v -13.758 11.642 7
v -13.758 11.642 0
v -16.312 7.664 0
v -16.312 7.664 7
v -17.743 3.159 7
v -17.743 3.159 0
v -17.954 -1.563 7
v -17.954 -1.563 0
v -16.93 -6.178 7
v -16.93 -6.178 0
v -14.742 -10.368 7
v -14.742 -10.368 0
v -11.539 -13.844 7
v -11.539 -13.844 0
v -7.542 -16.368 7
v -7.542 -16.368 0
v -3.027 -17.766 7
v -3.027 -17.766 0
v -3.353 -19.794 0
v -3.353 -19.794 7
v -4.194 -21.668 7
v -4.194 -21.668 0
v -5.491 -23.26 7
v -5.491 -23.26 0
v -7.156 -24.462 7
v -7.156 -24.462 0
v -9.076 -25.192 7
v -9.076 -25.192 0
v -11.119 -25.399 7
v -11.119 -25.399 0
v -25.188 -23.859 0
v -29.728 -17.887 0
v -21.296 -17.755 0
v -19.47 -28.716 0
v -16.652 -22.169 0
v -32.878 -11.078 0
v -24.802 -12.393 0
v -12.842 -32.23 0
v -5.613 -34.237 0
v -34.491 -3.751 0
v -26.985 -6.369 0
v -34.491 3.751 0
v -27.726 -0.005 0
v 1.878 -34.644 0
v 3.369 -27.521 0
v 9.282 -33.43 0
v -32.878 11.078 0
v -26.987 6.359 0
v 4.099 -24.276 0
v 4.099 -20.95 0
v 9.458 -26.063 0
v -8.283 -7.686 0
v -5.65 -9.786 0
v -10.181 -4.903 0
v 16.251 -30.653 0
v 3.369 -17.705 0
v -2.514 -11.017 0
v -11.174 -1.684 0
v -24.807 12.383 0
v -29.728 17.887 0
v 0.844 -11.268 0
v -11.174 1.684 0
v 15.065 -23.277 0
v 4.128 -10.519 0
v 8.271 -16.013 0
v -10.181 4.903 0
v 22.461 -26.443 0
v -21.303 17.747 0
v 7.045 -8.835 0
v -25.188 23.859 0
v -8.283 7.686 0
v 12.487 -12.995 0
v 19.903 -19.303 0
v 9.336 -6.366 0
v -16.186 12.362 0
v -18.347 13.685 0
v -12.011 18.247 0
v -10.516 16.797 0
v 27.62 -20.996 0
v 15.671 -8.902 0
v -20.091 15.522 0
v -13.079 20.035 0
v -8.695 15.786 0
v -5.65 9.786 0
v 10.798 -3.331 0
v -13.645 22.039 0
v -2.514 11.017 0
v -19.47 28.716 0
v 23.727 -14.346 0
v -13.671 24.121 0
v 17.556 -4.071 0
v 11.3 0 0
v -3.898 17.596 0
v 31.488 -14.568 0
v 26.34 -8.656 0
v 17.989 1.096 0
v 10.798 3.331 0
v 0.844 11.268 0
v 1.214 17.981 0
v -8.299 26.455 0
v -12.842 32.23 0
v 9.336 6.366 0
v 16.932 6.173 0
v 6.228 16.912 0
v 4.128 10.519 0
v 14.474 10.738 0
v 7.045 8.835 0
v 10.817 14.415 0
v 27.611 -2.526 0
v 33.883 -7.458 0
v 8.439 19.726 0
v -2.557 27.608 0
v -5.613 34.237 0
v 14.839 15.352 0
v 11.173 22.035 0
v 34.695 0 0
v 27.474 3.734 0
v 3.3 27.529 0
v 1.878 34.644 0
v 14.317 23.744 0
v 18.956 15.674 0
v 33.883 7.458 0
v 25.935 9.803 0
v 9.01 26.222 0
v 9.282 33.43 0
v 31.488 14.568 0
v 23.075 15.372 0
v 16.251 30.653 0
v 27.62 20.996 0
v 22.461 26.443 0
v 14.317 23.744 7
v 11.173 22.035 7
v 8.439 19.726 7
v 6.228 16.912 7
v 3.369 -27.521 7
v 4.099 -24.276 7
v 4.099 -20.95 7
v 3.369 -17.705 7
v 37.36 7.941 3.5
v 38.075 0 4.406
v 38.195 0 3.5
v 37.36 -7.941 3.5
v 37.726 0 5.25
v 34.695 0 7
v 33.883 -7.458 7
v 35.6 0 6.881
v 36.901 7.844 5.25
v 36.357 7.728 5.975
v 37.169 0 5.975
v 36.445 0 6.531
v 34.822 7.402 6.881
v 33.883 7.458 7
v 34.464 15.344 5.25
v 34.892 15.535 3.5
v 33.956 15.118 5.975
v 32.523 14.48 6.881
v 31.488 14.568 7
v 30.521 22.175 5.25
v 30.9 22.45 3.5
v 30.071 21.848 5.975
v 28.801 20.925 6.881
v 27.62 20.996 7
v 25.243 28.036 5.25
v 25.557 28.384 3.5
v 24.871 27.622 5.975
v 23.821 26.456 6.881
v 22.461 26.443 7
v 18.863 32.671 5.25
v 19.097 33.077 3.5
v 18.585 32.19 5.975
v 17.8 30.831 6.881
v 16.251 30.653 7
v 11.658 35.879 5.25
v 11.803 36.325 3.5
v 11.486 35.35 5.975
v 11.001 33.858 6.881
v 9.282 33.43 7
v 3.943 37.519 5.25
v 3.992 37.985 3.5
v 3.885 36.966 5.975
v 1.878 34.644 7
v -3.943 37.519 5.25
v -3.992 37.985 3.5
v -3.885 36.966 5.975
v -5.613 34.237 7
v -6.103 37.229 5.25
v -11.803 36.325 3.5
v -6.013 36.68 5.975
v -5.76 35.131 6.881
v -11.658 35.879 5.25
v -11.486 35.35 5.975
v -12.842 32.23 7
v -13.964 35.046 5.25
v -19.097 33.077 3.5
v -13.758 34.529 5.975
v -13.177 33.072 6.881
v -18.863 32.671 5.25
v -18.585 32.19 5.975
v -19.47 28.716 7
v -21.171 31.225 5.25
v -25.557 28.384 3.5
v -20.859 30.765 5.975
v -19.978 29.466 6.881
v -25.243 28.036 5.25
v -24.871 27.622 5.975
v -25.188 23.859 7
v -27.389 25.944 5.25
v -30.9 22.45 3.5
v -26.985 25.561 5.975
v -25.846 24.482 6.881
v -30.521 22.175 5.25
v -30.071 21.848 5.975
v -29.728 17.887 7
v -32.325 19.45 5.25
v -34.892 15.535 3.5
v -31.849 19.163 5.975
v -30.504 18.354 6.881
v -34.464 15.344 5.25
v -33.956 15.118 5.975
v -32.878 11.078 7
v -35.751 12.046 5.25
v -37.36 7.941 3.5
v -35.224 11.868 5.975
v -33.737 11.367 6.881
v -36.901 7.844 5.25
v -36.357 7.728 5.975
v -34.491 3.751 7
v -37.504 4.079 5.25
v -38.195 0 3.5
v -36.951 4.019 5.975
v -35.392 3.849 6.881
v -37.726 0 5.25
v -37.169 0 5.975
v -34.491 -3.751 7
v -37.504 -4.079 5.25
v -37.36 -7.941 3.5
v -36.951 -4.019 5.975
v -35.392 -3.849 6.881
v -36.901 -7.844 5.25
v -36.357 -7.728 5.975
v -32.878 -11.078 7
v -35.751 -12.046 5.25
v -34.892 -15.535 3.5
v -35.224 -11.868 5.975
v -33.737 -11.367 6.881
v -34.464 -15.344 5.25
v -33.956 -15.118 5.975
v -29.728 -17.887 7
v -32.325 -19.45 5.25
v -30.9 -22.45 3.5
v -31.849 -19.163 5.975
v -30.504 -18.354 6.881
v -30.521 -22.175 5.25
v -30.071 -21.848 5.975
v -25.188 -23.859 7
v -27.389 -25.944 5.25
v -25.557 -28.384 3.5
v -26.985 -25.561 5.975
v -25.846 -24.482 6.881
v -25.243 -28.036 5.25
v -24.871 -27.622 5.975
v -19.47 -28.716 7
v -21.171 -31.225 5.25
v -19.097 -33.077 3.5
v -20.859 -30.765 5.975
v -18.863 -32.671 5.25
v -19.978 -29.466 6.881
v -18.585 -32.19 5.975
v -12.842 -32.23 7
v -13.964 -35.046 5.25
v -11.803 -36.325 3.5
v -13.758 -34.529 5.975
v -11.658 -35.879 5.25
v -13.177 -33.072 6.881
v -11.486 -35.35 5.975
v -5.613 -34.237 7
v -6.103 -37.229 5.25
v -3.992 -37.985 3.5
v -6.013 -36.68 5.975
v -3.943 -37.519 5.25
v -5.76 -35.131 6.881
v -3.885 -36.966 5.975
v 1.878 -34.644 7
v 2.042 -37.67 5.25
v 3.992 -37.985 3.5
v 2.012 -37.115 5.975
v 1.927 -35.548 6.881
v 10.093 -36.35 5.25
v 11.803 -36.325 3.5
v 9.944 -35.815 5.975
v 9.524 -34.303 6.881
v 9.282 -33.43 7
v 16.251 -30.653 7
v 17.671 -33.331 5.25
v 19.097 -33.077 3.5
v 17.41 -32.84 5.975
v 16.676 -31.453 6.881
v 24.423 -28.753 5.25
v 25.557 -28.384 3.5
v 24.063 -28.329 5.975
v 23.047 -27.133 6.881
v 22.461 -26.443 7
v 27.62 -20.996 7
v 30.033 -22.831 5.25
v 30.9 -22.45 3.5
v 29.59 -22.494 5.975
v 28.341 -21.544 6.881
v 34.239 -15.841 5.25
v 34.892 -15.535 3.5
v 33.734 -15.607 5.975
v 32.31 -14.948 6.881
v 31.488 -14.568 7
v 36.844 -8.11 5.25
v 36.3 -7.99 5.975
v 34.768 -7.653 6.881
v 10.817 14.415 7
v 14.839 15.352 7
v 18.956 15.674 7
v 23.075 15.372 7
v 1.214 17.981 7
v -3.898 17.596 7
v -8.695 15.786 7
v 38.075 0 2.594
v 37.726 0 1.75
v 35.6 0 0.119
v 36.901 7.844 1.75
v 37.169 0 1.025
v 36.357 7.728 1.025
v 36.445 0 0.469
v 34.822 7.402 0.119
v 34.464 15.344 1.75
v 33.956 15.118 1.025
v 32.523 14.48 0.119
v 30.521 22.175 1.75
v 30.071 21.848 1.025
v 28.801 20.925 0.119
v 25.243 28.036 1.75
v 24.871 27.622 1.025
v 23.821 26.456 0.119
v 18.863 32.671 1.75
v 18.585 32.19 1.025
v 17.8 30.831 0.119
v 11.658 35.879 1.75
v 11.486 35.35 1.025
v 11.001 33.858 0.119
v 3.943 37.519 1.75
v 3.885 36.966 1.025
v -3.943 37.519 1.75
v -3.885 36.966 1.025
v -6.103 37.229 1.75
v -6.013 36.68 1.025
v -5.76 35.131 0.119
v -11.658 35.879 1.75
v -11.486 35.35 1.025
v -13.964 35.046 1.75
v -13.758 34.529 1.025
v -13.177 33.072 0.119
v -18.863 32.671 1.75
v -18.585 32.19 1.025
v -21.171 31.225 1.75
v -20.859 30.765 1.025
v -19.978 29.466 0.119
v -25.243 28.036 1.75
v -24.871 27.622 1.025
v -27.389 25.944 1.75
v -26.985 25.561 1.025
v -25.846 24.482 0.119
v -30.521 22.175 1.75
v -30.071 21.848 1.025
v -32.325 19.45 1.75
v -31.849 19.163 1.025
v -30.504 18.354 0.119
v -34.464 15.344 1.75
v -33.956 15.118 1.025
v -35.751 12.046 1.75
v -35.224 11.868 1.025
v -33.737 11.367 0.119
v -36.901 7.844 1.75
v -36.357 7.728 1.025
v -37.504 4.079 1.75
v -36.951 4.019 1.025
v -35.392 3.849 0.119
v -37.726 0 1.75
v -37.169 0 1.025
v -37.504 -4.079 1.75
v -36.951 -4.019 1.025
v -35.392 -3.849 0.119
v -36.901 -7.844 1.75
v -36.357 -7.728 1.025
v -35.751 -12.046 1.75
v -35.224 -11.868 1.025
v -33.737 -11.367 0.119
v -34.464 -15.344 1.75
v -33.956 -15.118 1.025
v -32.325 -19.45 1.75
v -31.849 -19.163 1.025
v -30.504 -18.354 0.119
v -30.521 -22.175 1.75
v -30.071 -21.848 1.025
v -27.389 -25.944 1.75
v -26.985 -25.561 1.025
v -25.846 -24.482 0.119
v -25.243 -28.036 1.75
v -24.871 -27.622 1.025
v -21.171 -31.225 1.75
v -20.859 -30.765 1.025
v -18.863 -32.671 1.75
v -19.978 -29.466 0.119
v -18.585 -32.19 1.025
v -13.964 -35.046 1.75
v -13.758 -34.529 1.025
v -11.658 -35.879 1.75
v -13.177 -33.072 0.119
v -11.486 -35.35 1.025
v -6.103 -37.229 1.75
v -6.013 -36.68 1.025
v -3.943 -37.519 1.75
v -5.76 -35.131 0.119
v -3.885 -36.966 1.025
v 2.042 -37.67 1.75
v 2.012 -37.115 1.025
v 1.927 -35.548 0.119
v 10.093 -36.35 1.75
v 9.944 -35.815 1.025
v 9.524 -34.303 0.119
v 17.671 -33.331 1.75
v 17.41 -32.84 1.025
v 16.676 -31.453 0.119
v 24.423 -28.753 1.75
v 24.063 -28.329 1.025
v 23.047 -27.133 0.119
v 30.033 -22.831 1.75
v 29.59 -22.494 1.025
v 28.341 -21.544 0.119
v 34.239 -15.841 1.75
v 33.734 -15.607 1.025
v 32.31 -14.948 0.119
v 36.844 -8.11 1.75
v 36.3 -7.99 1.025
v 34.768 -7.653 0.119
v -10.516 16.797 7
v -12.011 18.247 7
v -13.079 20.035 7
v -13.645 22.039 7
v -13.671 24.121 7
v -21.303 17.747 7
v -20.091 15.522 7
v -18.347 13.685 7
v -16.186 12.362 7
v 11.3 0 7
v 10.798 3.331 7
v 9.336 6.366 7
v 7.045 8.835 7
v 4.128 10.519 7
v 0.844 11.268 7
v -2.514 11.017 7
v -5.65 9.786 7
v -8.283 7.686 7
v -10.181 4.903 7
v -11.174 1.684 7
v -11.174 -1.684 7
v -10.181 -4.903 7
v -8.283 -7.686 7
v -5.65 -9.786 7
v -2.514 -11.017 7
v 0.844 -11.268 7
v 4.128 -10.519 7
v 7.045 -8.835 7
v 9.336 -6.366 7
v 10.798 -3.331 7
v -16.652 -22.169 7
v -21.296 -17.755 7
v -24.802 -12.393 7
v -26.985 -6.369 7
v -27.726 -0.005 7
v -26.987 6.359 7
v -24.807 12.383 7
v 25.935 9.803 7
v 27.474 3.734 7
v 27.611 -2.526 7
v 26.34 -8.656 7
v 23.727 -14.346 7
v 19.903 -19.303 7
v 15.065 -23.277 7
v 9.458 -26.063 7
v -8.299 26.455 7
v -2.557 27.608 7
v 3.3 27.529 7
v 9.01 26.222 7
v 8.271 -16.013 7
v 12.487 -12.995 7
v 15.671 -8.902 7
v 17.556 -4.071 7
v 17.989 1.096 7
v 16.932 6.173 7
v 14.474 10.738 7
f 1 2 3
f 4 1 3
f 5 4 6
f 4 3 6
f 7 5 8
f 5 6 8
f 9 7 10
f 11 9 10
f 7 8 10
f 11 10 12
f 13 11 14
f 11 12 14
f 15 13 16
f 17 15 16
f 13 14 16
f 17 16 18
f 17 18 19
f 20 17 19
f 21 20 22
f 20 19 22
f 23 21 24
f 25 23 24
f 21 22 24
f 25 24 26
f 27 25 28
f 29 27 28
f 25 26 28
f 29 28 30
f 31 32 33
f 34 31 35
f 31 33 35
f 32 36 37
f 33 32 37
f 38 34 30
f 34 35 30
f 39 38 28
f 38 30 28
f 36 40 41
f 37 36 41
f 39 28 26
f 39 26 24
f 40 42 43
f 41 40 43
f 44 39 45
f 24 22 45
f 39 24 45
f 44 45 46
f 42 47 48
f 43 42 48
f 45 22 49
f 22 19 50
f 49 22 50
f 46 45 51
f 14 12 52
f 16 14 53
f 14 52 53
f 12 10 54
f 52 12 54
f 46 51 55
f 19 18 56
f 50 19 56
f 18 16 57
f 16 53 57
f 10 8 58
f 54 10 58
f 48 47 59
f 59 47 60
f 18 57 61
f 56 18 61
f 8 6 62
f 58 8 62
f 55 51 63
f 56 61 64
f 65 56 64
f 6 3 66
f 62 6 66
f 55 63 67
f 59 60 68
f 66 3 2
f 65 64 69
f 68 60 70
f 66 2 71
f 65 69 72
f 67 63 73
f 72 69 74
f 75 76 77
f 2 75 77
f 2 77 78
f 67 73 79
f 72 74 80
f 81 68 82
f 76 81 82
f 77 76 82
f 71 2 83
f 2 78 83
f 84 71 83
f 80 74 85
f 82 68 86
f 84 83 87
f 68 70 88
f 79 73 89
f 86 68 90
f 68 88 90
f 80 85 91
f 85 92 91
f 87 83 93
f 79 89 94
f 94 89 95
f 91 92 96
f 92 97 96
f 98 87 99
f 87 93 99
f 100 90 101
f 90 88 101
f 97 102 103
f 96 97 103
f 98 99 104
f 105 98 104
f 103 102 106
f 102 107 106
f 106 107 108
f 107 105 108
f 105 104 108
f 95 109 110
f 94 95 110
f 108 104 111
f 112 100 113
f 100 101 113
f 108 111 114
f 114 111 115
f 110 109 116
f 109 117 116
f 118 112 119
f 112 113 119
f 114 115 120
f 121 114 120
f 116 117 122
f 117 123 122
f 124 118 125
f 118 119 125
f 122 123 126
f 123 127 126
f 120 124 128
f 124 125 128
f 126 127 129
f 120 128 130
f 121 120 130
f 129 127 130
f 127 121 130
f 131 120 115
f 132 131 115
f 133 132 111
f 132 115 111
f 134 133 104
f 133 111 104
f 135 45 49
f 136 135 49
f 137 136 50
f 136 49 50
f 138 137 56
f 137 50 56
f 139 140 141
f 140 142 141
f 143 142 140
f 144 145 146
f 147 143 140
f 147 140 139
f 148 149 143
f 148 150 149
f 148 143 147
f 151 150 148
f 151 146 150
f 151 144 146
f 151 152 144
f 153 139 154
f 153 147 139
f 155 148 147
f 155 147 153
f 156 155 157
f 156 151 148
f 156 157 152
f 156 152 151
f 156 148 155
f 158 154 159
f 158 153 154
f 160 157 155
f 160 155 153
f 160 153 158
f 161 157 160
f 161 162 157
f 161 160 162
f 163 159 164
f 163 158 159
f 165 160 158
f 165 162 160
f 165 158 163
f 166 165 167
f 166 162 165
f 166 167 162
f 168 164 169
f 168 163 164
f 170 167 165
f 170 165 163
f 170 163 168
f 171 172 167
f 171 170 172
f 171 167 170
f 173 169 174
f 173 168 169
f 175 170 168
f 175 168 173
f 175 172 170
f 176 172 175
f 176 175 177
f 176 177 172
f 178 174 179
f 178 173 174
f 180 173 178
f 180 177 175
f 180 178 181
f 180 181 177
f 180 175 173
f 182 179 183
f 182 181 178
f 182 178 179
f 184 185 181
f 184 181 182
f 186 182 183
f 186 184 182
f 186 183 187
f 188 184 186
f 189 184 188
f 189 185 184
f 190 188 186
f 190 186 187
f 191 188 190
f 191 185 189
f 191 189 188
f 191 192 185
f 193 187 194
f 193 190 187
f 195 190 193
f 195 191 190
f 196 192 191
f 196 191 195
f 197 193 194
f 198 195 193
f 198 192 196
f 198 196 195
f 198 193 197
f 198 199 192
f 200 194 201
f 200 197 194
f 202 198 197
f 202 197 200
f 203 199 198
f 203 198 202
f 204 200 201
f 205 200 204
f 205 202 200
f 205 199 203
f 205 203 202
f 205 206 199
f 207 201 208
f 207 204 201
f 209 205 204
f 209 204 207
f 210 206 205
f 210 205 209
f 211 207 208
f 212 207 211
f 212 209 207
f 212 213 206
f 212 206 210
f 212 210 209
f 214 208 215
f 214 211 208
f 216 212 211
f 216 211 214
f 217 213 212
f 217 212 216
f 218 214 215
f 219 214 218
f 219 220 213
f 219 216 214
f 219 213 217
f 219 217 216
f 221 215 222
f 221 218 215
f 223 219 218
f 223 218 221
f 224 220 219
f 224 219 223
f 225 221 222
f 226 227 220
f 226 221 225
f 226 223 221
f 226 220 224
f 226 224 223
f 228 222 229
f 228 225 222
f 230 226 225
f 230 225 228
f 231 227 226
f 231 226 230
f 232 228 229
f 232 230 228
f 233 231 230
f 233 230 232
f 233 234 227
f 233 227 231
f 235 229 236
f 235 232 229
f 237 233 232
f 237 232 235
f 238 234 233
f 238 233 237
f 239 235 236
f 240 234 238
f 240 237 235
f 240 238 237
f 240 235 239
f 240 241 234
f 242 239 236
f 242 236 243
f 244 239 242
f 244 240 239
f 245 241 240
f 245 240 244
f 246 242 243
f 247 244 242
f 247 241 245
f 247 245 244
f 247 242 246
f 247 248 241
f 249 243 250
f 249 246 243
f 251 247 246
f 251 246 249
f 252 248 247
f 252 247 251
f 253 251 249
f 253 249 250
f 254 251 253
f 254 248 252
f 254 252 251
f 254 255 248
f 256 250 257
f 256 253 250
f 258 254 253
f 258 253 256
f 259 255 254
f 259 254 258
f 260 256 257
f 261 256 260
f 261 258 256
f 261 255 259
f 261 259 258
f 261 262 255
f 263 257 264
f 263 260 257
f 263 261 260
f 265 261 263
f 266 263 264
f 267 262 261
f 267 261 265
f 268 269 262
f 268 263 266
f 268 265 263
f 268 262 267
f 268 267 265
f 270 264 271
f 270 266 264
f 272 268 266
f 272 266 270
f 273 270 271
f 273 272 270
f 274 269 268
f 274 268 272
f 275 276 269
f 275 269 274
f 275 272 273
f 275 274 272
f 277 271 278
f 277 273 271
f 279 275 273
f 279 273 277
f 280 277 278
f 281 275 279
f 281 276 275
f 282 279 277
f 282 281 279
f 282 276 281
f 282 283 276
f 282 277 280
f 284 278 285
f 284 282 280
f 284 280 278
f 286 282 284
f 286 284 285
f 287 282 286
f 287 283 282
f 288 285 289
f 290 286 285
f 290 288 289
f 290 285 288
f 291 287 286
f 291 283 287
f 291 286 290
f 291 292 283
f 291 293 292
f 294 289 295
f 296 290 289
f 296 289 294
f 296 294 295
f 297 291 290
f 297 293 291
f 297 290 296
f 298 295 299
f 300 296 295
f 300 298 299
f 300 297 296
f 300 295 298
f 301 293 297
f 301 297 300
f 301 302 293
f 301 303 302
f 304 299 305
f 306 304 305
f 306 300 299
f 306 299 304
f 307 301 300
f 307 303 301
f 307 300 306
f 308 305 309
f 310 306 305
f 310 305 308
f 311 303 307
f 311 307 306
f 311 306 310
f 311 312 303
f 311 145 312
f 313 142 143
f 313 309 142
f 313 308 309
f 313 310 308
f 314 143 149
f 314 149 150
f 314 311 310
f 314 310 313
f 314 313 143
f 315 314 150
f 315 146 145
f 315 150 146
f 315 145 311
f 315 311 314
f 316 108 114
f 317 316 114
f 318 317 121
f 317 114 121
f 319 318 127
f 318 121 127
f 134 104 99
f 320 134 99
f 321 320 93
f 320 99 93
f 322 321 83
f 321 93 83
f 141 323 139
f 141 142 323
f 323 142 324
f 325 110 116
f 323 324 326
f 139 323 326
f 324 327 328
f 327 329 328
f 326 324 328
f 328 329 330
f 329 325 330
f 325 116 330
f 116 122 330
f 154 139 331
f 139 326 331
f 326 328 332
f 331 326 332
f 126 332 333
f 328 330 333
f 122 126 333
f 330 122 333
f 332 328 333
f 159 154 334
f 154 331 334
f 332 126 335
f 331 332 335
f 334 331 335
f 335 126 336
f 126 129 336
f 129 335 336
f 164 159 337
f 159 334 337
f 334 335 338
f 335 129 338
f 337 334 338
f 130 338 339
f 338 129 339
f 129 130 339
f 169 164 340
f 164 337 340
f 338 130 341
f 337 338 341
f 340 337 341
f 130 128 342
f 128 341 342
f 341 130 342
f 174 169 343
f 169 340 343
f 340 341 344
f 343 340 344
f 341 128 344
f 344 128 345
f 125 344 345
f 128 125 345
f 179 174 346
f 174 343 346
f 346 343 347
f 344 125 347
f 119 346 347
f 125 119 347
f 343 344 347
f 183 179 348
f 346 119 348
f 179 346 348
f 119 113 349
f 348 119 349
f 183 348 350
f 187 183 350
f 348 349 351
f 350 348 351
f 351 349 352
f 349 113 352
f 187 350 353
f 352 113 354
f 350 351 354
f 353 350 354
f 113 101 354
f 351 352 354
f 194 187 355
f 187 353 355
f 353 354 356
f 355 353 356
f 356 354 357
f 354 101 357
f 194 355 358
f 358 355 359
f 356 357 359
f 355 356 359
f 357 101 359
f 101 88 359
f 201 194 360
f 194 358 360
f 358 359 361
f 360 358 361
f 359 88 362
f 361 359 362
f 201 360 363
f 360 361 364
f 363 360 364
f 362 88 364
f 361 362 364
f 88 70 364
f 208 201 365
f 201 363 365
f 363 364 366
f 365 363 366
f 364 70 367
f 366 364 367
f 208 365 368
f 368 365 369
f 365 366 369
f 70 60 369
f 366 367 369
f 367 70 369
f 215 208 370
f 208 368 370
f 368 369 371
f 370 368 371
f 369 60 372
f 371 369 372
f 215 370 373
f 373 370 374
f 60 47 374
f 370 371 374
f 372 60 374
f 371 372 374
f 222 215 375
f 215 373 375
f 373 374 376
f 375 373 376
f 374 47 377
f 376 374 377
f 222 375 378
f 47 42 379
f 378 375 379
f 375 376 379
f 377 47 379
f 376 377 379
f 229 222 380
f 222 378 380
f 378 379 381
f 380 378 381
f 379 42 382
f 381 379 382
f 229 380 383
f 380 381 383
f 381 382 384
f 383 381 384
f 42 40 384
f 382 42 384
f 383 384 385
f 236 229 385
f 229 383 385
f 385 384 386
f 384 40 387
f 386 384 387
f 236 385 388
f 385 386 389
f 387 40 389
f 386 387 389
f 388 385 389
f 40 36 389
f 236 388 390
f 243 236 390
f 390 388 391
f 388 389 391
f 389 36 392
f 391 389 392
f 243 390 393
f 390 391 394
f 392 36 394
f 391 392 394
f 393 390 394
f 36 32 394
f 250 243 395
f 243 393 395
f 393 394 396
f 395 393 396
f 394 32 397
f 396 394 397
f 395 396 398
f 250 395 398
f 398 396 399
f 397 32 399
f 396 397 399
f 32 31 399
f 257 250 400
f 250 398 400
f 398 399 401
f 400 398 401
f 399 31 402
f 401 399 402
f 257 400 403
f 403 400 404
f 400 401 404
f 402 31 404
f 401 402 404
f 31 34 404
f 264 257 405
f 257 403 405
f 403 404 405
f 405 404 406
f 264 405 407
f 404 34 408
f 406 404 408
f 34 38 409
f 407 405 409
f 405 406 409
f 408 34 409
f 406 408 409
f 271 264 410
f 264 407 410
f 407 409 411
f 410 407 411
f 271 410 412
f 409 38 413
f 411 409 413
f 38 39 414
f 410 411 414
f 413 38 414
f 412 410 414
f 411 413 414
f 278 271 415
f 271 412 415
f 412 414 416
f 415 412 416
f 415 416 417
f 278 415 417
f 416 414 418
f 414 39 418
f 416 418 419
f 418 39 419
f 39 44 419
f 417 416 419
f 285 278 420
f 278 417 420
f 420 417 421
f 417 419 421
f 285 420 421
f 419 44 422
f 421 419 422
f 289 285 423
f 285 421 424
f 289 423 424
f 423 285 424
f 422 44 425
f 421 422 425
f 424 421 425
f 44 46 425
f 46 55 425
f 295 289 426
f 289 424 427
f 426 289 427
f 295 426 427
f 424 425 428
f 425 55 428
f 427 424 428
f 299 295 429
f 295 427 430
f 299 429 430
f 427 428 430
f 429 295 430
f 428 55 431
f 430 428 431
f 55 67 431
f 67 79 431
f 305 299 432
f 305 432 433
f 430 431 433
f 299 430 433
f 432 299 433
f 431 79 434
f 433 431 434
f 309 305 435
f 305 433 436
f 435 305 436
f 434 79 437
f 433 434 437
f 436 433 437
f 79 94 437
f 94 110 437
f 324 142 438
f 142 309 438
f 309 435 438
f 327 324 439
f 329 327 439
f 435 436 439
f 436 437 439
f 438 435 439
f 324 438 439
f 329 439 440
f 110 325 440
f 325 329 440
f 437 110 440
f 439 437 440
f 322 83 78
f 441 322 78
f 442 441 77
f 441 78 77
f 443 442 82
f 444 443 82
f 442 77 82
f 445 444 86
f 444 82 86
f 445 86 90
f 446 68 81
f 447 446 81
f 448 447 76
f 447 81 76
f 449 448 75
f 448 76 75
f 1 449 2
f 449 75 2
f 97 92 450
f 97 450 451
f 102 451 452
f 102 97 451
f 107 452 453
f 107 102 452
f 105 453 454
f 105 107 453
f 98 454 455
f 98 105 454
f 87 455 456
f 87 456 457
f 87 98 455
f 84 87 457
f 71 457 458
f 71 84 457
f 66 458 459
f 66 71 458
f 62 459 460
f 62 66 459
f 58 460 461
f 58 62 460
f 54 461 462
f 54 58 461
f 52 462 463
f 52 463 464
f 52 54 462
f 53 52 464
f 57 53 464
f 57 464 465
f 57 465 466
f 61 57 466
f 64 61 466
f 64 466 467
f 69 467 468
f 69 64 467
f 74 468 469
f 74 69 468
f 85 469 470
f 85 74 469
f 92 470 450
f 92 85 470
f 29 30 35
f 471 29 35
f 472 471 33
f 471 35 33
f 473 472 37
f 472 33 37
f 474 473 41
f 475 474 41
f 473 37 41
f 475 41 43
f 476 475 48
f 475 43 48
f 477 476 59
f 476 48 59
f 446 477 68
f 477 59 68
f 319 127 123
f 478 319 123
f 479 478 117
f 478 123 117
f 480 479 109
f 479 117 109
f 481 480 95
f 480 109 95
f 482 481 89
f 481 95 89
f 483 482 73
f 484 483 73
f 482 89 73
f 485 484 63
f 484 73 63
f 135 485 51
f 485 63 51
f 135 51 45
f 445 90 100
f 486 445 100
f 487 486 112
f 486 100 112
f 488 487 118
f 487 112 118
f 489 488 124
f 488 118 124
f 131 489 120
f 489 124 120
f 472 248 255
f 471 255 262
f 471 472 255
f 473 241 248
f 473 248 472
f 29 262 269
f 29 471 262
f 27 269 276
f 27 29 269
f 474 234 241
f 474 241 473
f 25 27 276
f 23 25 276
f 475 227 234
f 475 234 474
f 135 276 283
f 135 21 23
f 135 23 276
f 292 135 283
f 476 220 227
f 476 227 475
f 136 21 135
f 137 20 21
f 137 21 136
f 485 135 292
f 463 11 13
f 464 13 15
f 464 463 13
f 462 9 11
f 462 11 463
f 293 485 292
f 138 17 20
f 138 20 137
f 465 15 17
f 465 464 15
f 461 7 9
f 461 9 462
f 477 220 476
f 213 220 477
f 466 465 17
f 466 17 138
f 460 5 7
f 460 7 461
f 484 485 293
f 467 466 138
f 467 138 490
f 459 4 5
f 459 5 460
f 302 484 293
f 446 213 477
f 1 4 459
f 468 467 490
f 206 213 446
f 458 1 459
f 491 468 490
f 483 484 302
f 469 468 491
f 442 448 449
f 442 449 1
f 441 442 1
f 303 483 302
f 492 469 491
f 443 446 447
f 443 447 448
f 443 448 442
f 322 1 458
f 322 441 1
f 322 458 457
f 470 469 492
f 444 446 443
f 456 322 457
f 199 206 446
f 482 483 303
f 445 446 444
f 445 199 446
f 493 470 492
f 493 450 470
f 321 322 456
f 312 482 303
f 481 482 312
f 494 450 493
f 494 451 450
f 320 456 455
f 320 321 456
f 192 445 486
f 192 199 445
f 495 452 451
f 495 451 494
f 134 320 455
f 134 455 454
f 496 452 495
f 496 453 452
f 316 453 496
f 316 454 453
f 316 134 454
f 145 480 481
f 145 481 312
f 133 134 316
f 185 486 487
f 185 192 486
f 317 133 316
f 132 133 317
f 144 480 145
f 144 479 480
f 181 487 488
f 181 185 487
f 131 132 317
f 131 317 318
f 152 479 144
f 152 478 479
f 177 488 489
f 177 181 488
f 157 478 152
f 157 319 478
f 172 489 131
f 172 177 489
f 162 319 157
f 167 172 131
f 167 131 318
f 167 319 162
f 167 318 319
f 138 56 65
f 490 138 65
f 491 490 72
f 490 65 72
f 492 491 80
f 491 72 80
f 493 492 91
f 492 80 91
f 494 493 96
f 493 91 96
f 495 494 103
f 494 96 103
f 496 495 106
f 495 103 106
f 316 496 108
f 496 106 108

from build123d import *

# Parameters (mm, degrees)
F0_R     = 38.1945033512
F0_R_2   = 11.3
F1_DEPTH = 7
F2_R     = 3.49999


# Not quite as in the source:
# - a fillet or chamfer is up to 0.001 mm smaller than in the source, because OpenCascade refuses the exact size


with BuildPart() as f1:
    # F0 (on Top) → F1 (new body)
    with BuildSketch(Plane.XY):
        Circle(F0_R)
        with BuildLine():
            ThreePointArc((-11.1190587191, -25.3990096631), (-26.9847609568, -6.3691313979), (-21.3025923236, 17.7466255653))
            ThreePointArc((-21.3025923236, 17.7466255653), (-18.3465502514, 13.6852419499), (-13.7577746625, 11.6416763896))
            ThreePointArc((-13.7577746625, 11.6416763896), (-16.9304092047, -6.1778828887), (-3.0268251987, -17.7663536507))
            ThreePointArc((-3.0268251987, -17.7663536507), (-5.4906522747, -23.2602441725), (-11.1190587191, -25.3990096631))
        make_face(mode=Mode.SUBTRACT)
        with BuildLine():
            ThreePointArc((3.3689917925, -27.5207749339), (4.1908869079, -22.6127160748), (3.3689917925, -17.7046572157))
            ThreePointArc((3.3689917925, -17.7046572157), (17.5564618696, -4.0713191283), (10.8174583905, 14.4148391179))
            ThreePointArc((10.8174583905, 14.4148391179), (16.8916900663, 15.5906448864), (23.0748101796, 15.3719320138))
            ThreePointArc((23.0748101796, 15.3719320138), (25.1945379599, -11.5749045633), (3.3689917925, -27.5207749339))
        make_face(mode=Mode.SUBTRACT)
        Circle(F0_R_2, mode=Mode.SUBTRACT)
        with BuildLine():
            ThreePointArc((-8.6949064417, 15.7861836678), (-12.603803519, 19.1055384299), (-13.6713432148, 24.1213086993))
            ThreePointArc((-13.6713432148, 24.1213086993), (0.373914134, 27.7236964866), (14.3169083029, 23.7438264673))
            ThreePointArc((14.3169083029, 23.7438264673), (9.7472249081, 20.9497927504), (6.2279462514, 16.9120571875))
            ThreePointArc((6.2279462514, 16.9120571875), (-1.3558653844, 17.9712721276), (-8.6949064417, 15.7861836678))
        make_face(mode=Mode.SUBTRACT)
    extrude(amount=F1_DEPTH)

    # F2 (radius 3.5 in the source; OpenCascade refuses exactly that, so slightly less here)
    f2_edges = [f1.edges().sort_by_distance(p)[0] for p in [
        (-38.194503, 0, 7),
        (-38.194503, 0, 0),
    ]]
    fillet(f2_edges, radius=F2_R)


solid = f1.part
